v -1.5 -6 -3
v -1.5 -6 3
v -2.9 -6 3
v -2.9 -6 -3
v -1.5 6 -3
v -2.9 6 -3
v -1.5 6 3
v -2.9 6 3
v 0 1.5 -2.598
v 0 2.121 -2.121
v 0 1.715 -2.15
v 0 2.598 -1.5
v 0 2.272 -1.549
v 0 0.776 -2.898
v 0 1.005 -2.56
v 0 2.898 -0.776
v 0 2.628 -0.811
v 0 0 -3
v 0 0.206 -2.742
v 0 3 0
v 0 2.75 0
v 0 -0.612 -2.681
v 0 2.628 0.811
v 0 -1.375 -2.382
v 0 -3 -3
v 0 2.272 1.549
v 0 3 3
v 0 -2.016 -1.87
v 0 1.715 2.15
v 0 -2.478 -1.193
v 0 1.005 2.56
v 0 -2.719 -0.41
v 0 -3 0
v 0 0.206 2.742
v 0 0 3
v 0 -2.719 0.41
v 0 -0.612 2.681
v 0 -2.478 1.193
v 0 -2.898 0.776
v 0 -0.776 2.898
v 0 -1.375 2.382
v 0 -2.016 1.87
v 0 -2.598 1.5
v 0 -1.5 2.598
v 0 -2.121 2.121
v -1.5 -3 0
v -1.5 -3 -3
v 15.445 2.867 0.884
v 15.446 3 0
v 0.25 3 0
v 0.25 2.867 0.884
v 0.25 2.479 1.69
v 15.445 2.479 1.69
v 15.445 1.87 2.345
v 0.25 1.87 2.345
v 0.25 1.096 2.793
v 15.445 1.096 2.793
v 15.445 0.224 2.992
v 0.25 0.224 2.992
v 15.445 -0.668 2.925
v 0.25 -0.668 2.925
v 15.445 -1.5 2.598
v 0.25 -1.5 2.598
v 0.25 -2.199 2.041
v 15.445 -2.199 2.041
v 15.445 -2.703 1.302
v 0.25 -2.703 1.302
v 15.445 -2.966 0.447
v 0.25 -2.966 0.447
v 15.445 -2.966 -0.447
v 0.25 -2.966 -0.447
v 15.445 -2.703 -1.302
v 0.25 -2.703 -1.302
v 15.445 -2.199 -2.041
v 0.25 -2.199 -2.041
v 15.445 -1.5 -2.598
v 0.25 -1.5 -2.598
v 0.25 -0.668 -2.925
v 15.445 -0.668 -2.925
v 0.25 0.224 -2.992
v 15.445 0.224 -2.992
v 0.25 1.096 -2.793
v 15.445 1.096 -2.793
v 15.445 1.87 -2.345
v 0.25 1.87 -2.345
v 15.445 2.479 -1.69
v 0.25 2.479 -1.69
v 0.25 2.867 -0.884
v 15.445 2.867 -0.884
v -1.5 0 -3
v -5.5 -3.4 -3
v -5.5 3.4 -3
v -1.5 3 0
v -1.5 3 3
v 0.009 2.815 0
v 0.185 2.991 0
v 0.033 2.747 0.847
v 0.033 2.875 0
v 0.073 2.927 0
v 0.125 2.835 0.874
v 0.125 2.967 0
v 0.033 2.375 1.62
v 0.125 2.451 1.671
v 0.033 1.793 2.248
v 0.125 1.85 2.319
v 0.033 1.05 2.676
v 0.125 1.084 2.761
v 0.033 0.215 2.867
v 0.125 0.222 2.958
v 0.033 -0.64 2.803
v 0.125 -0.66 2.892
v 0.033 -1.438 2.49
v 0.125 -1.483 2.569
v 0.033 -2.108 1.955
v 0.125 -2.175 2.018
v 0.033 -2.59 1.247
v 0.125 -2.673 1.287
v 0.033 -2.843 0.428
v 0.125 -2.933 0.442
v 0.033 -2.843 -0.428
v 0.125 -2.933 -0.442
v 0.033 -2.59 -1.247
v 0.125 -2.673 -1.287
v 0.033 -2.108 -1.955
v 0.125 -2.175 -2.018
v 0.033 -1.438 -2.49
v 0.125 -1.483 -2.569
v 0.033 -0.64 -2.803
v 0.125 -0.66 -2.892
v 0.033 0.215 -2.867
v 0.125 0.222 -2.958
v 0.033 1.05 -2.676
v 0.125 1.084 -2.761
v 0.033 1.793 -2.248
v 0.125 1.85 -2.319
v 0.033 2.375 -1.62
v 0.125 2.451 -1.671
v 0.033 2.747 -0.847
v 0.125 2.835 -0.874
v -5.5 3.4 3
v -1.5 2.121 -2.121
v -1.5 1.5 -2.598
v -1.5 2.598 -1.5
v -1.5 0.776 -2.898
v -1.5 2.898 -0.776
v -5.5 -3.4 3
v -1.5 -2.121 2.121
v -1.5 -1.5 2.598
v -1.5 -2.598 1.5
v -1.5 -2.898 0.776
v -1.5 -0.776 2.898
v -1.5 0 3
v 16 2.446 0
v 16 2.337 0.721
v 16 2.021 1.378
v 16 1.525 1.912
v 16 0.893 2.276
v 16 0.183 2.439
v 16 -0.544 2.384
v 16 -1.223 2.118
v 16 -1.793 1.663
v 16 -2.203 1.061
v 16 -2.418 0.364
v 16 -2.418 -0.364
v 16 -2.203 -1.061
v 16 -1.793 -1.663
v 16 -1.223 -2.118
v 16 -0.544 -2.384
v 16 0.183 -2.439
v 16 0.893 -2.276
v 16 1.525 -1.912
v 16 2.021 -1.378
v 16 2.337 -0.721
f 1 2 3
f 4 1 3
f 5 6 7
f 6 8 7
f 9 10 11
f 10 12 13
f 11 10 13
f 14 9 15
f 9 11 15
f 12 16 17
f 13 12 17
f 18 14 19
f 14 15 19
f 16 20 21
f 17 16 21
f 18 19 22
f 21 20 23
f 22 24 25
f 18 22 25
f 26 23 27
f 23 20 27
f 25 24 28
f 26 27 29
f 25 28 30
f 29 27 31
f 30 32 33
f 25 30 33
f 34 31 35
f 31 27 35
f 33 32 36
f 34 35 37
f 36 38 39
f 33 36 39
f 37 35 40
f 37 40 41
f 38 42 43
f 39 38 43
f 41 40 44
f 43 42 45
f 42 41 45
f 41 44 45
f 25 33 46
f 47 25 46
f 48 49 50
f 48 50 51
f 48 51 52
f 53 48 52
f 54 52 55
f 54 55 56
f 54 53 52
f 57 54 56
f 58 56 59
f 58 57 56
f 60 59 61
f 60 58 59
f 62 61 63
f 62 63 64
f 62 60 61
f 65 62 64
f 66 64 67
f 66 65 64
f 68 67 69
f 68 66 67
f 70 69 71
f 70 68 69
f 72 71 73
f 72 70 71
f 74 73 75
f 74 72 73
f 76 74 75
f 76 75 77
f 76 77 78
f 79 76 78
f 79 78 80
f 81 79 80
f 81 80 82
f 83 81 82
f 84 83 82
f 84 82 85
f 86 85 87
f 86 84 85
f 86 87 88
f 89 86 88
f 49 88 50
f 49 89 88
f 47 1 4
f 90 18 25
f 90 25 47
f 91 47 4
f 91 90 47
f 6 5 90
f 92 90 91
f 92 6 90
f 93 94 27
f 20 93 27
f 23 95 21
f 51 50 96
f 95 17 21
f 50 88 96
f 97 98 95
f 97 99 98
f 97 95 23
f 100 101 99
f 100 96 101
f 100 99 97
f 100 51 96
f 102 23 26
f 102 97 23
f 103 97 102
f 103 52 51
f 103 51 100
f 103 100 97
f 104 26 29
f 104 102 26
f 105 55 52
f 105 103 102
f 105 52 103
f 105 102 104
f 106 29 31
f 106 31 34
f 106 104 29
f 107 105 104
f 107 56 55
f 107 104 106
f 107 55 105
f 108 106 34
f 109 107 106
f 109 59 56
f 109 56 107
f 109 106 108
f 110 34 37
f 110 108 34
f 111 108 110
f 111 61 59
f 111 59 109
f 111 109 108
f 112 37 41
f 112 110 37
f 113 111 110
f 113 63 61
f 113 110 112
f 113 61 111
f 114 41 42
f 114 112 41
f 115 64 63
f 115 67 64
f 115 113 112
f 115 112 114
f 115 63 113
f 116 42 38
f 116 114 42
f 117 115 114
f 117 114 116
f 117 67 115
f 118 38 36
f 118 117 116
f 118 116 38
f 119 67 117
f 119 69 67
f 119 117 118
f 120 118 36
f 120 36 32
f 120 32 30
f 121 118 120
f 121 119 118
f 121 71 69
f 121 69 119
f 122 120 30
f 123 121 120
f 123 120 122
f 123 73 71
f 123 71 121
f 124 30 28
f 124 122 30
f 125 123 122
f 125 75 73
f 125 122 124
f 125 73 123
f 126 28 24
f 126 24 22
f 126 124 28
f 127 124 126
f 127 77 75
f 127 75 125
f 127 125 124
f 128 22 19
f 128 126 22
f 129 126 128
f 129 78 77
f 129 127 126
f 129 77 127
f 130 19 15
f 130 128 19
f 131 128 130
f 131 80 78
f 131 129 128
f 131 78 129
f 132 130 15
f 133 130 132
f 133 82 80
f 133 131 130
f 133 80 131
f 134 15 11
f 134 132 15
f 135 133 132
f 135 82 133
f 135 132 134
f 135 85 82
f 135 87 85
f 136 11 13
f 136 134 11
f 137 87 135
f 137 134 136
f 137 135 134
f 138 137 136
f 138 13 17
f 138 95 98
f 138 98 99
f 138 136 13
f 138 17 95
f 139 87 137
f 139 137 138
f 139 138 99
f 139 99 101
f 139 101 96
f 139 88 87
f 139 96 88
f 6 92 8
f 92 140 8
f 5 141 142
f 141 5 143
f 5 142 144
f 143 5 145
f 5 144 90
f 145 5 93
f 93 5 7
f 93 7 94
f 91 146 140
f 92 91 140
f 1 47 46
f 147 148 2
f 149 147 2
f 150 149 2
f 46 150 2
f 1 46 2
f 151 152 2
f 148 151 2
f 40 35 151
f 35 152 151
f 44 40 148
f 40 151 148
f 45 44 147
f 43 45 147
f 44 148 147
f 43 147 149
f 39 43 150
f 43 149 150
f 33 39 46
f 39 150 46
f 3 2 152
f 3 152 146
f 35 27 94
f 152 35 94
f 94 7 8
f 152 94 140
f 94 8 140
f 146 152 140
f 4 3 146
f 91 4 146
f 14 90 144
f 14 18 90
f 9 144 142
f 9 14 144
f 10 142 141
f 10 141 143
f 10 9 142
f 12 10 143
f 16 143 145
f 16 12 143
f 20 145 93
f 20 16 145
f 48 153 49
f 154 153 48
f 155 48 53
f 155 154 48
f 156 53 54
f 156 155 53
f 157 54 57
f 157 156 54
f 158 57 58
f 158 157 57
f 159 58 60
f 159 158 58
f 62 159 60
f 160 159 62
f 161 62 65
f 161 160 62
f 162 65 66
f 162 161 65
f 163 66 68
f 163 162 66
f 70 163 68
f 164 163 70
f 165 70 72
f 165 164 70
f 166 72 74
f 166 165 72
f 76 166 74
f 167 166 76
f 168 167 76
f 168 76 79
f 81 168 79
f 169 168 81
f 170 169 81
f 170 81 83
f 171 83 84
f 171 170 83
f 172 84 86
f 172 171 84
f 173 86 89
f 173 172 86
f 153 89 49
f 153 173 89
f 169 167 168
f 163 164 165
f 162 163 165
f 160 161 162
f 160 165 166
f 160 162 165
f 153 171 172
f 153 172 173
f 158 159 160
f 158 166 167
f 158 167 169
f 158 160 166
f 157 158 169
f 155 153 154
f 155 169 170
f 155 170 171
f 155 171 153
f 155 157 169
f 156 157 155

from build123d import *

# Parameters (mm, degrees)
FILLET1_R           = 0.25
BOSS_EXTRUDE1_DEPTH = 3
FILLET2_R           = 3


with BuildPart() as part:
    # BodySke → Base-Revolve (revolve)
    with BuildSketch(Plane.XY):
        Polygon((0, 0), (0, 3), (15.4455, 3), (16, 2.4455), (16, 0), align=None)
    revolve(axis=Axis((-31.75, 0, 0), (1, 0, 0)))

    # Fillet1
    fillet1_edges = [part.edges().sort_by_distance(p)[0] for p in [
        (0, -3, 0),
    ]]
    fillet(fillet1_edges, radius=FILLET1_R)

    # Sketch1 → Boss-Extrude1 (add, symmetric)
    with BuildSketch(Plane.XY):
        Polygon((-5.5, -3.4), (-5.5, 3.4), (-2.9, 6), (-1.5, 6), (-1.5, 3), (0, 3), (0, -3), (-1.5, -3), (-1.5, -6), (-2.9, -6), align=None)
    extrude(amount=BOSS_EXTRUDE1_DEPTH, both=True)

    # Fillet2
    fillet2_edges = [part.edges().sort_by_distance(p)[0] for p in [
        (-0.75, 3, -3),
        (-0.75, -3, 3),
    ]]
    fillet(fillet2_edges, radius=FILLET2_R)


solid = part.part
